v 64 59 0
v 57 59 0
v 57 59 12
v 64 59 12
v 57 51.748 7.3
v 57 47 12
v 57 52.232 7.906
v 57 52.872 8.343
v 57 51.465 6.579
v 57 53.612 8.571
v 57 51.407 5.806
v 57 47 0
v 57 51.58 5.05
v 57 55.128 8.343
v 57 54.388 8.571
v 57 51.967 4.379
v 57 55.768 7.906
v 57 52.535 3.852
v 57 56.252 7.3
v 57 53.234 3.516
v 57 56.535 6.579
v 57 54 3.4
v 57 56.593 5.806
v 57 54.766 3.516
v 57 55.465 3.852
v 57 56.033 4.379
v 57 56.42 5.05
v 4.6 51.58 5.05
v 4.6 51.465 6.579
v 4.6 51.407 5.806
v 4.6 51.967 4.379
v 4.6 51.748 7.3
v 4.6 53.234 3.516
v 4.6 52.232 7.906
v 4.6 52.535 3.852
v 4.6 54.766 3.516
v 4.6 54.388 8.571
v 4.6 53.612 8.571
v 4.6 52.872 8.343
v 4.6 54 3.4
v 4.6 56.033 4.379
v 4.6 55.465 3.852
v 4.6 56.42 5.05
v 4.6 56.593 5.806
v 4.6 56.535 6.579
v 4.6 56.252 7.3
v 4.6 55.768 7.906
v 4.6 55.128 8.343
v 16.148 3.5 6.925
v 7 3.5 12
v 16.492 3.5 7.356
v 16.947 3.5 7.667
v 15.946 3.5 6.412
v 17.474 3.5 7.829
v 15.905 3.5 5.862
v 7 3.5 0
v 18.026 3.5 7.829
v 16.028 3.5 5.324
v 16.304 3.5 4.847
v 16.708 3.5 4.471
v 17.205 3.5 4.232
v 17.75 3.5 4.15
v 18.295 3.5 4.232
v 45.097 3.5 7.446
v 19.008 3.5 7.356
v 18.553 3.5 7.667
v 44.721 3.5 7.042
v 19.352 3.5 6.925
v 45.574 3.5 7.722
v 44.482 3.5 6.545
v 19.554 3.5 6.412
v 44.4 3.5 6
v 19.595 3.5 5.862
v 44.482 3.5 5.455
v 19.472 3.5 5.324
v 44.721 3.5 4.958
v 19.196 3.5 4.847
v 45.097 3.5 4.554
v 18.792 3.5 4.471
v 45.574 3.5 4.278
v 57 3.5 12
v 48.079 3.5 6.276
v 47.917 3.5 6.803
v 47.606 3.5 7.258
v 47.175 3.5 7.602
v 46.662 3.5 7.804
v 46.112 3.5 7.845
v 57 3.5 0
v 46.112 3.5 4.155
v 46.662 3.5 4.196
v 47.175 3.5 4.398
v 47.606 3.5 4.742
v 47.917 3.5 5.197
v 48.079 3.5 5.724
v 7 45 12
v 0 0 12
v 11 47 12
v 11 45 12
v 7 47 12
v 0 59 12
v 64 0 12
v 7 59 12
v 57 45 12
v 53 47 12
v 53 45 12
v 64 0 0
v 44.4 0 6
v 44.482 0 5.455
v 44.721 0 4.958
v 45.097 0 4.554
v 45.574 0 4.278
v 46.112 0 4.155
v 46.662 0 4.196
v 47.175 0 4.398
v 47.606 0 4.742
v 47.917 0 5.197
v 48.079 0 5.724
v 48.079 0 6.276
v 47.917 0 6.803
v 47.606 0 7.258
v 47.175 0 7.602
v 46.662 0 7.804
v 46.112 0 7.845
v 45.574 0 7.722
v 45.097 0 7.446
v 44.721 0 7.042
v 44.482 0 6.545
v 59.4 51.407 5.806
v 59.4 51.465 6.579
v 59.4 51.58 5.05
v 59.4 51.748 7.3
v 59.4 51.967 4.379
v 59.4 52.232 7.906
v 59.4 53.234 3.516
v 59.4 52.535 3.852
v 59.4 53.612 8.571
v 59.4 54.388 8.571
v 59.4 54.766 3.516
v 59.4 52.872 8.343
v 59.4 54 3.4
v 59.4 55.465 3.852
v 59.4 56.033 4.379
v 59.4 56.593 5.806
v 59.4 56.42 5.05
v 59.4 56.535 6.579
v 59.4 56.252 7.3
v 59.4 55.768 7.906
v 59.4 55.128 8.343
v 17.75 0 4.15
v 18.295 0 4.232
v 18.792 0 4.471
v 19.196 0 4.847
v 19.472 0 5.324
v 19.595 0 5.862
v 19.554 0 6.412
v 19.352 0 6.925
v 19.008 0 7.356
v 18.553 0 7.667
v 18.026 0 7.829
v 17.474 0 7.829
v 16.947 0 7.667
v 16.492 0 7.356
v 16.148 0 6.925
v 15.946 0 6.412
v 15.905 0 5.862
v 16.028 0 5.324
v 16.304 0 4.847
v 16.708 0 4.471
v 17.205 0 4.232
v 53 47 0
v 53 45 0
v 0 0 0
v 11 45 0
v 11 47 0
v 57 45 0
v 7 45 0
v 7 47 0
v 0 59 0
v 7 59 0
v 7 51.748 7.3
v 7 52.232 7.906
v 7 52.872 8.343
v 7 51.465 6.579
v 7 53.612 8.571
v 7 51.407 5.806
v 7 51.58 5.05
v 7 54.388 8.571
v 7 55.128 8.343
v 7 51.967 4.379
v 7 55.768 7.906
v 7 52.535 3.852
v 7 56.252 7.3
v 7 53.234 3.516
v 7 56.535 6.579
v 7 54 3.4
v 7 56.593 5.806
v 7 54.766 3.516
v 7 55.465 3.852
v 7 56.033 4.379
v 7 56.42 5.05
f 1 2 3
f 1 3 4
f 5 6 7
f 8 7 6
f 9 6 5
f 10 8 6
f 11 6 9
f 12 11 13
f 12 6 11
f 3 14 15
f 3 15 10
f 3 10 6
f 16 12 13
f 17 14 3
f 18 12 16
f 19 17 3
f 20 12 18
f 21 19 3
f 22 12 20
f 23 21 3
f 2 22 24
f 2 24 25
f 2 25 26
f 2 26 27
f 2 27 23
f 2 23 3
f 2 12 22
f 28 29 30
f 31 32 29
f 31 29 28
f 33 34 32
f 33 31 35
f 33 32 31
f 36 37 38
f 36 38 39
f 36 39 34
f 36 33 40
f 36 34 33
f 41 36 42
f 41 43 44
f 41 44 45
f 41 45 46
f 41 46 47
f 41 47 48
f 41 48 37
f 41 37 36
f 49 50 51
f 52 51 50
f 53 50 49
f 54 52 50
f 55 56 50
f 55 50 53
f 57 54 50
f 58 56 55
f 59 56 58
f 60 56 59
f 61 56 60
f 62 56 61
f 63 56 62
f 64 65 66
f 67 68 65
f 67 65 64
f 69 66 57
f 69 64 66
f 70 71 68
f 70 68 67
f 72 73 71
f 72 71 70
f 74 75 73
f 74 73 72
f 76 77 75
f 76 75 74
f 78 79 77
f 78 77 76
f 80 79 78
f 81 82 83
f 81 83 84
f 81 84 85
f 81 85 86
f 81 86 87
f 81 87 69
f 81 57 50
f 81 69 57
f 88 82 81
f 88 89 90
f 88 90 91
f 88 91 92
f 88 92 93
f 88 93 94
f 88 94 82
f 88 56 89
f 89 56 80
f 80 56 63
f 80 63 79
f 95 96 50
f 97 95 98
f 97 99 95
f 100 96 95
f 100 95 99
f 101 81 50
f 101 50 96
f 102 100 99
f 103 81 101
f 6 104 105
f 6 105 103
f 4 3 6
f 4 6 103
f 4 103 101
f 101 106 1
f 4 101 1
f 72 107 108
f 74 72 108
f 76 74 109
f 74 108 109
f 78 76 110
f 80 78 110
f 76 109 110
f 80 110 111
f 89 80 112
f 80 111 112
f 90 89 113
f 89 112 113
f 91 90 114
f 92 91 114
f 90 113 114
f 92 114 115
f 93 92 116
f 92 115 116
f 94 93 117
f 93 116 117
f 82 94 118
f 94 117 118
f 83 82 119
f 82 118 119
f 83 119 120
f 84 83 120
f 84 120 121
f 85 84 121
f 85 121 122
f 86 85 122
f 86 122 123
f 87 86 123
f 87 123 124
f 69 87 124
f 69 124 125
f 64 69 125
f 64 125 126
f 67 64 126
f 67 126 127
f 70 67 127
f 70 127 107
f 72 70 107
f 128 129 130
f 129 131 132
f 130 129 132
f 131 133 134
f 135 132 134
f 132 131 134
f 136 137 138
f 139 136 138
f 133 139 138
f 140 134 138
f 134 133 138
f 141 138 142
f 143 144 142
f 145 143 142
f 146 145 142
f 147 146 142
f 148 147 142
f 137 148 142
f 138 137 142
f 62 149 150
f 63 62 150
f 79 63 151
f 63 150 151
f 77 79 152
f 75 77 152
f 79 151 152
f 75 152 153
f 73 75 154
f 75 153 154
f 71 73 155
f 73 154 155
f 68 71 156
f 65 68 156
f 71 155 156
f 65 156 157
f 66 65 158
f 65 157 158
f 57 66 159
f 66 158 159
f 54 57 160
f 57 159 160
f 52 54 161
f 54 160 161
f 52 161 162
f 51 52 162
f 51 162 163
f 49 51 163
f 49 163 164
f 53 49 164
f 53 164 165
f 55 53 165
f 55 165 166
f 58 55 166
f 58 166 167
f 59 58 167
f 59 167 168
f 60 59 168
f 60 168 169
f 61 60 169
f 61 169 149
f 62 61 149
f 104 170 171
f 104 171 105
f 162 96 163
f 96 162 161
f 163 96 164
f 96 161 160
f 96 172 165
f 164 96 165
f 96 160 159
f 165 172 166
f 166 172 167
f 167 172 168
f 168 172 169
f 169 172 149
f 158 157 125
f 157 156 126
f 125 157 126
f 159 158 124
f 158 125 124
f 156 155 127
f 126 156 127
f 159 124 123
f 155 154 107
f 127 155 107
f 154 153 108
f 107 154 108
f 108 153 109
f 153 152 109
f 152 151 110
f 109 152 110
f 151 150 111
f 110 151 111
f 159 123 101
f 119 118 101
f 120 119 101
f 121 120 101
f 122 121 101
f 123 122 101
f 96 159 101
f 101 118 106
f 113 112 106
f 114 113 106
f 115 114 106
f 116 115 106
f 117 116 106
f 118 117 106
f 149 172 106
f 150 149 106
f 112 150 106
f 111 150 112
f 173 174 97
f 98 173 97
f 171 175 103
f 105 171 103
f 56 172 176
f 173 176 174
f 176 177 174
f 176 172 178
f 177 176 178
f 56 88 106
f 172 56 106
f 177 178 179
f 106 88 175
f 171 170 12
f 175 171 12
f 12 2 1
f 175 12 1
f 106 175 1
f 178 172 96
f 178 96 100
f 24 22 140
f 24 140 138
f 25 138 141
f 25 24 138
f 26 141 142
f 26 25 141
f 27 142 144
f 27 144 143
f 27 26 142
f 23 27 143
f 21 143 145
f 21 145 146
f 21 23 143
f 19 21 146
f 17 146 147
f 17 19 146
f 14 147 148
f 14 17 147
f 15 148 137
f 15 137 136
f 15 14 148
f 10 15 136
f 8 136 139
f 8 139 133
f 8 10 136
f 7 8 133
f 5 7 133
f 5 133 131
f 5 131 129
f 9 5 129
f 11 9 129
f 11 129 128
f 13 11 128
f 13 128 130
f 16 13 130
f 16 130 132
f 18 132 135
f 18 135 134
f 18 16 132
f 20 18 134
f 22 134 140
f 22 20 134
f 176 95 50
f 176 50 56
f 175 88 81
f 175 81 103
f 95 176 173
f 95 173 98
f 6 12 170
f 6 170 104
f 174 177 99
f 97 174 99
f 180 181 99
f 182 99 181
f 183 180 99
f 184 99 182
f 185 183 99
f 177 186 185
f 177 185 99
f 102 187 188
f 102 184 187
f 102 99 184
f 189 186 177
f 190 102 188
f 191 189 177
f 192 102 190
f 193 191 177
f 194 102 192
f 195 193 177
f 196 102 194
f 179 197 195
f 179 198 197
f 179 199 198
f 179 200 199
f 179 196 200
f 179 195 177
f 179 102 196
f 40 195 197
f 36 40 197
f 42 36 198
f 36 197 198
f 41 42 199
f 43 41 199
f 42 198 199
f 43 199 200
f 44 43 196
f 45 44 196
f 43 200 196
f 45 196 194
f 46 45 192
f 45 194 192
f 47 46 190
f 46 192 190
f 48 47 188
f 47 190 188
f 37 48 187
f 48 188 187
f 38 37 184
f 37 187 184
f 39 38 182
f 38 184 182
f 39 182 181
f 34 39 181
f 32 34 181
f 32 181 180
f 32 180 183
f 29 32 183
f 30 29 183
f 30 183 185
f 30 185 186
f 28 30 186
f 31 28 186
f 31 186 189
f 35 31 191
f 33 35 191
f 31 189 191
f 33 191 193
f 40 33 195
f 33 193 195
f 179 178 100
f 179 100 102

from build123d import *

# Parameters (mm, degrees)
SKETCH1_W           = 64
SKETCH1_H           = 59
SKETCH1_W_2         = 50
SKETCH1_H_2         = 52
BOSS_EXTRUDE1_DEPTH = 12
SKETCH2_R           = 1.85
CUT_EXTRUDE1_DEPTH  = 10
SKETCH3_R           = 1.85
CUT_EXTRUDE2_DEPTH  = 10
SKETCH4_W           = 50
SKETCH4_H           = 12
SKETCH4_R           = 1.85
CUT_EXTRUDE4_DEPTH  = 10
SKETCH6_R           = 2.6
CUT_EXTRUDE5_DEPTH  = 2.4
SKETCH7_W           = 12
SKETCH7_H           = 2
BOSS_EXTRUDE2_DEPTH = 4


with BuildPart() as part:
    # Sketch1 → Boss-Extrude1 (new body)
    with BuildSketch(Plane.XY):
        with Locations((32, 29.5)):
            Rectangle(SKETCH1_W, SKETCH1_H)
        with Locations((32, 29.5)):
            Rectangle(SKETCH1_W_2, SKETCH1_H_2, mode=Mode.SUBTRACT)
    extrude(amount=BOSS_EXTRUDE1_DEPTH)

    # Sketch2 → Cut-Extrude1 (cut)
    with BuildSketch(Plane(origin=(0, 59, 0), x_dir=(1, 0, 0), z_dir=(0, 1, 0))):
        with Locations(Location((18, -9.7, 0), (0, 0, 180))):
            Circle(SKETCH2_R)
        with Locations(Location((46, -9.7, 0), (0, 0, 180))):
            Circle(SKETCH2_R)
        with Locations(Location((32, -9.7, 0), (0, 0, 180))):
            Circle(SKETCH2_R)
    extrude(amount=-CUT_EXTRUDE1_DEPTH, mode=Mode.SUBTRACT)

    # Sketch3 → Cut-Extrude2 (cut)
    with BuildSketch(Plane.XZ):
        with Locations(Location((17.75, 6, 0), (0, 0, 270))):
            Circle(SKETCH3_R)
        with Locations(Location((46.25, 6, 0), (0, 0, 180))):
            Circle(SKETCH3_R)
    extrude(amount=-CUT_EXTRUDE2_DEPTH, mode=Mode.SUBTRACT)

    # Sketch4 → Cut-Extrude4 (cut)
    with BuildSketch(Plane(origin=(0, 59, 0), x_dir=(1, 0, 0), z_dir=(0, 1, 0))):
        with Locations((32, -6)):
            Rectangle(SKETCH4_W, SKETCH4_H)
        with Locations((18, -9.7)):
            Circle(SKETCH4_R, mode=Mode.SUBTRACT)
        with Locations((32, -9.7)):
            Circle(SKETCH4_R, mode=Mode.SUBTRACT)
        with Locations((46, -9.7)):
            Circle(SKETCH4_R, mode=Mode.SUBTRACT)
    extrude(amount=-CUT_EXTRUDE4_DEPTH, mode=Mode.SUBTRACT)

    # Sketch6 → Cut-Extrude5 (cut)
    with BuildSketch(Plane(origin=(7, 0, 0), x_dir=(0, 0, -1), z_dir=(1, 0, 0))):
        with Locations((-6, 54)):
            Circle(SKETCH6_R)
    cut_extrude5 = extrude(amount=-CUT_EXTRUDE5_DEPTH, mode=Mode.SUBTRACT)

    # Mirror1: Cut-Extrude5 across plane
    add(cut_extrude5.mirror(Plane.ZY.offset(-32)), mode=Mode.SUBTRACT)

    # Sketch7 → Boss-Extrude2 (add)
    with BuildSketch(Plane.ZY.offset(-57)):
        with Locations((6, 46)):
            Rectangle(SKETCH7_W, SKETCH7_H)
    boss_extrude2 = extrude(amount=BOSS_EXTRUDE2_DEPTH)

    # Mirror2: Boss-Extrude2 across plane
    add(boss_extrude2.mirror(Plane.ZY.offset(-32)))


solid = part.part
